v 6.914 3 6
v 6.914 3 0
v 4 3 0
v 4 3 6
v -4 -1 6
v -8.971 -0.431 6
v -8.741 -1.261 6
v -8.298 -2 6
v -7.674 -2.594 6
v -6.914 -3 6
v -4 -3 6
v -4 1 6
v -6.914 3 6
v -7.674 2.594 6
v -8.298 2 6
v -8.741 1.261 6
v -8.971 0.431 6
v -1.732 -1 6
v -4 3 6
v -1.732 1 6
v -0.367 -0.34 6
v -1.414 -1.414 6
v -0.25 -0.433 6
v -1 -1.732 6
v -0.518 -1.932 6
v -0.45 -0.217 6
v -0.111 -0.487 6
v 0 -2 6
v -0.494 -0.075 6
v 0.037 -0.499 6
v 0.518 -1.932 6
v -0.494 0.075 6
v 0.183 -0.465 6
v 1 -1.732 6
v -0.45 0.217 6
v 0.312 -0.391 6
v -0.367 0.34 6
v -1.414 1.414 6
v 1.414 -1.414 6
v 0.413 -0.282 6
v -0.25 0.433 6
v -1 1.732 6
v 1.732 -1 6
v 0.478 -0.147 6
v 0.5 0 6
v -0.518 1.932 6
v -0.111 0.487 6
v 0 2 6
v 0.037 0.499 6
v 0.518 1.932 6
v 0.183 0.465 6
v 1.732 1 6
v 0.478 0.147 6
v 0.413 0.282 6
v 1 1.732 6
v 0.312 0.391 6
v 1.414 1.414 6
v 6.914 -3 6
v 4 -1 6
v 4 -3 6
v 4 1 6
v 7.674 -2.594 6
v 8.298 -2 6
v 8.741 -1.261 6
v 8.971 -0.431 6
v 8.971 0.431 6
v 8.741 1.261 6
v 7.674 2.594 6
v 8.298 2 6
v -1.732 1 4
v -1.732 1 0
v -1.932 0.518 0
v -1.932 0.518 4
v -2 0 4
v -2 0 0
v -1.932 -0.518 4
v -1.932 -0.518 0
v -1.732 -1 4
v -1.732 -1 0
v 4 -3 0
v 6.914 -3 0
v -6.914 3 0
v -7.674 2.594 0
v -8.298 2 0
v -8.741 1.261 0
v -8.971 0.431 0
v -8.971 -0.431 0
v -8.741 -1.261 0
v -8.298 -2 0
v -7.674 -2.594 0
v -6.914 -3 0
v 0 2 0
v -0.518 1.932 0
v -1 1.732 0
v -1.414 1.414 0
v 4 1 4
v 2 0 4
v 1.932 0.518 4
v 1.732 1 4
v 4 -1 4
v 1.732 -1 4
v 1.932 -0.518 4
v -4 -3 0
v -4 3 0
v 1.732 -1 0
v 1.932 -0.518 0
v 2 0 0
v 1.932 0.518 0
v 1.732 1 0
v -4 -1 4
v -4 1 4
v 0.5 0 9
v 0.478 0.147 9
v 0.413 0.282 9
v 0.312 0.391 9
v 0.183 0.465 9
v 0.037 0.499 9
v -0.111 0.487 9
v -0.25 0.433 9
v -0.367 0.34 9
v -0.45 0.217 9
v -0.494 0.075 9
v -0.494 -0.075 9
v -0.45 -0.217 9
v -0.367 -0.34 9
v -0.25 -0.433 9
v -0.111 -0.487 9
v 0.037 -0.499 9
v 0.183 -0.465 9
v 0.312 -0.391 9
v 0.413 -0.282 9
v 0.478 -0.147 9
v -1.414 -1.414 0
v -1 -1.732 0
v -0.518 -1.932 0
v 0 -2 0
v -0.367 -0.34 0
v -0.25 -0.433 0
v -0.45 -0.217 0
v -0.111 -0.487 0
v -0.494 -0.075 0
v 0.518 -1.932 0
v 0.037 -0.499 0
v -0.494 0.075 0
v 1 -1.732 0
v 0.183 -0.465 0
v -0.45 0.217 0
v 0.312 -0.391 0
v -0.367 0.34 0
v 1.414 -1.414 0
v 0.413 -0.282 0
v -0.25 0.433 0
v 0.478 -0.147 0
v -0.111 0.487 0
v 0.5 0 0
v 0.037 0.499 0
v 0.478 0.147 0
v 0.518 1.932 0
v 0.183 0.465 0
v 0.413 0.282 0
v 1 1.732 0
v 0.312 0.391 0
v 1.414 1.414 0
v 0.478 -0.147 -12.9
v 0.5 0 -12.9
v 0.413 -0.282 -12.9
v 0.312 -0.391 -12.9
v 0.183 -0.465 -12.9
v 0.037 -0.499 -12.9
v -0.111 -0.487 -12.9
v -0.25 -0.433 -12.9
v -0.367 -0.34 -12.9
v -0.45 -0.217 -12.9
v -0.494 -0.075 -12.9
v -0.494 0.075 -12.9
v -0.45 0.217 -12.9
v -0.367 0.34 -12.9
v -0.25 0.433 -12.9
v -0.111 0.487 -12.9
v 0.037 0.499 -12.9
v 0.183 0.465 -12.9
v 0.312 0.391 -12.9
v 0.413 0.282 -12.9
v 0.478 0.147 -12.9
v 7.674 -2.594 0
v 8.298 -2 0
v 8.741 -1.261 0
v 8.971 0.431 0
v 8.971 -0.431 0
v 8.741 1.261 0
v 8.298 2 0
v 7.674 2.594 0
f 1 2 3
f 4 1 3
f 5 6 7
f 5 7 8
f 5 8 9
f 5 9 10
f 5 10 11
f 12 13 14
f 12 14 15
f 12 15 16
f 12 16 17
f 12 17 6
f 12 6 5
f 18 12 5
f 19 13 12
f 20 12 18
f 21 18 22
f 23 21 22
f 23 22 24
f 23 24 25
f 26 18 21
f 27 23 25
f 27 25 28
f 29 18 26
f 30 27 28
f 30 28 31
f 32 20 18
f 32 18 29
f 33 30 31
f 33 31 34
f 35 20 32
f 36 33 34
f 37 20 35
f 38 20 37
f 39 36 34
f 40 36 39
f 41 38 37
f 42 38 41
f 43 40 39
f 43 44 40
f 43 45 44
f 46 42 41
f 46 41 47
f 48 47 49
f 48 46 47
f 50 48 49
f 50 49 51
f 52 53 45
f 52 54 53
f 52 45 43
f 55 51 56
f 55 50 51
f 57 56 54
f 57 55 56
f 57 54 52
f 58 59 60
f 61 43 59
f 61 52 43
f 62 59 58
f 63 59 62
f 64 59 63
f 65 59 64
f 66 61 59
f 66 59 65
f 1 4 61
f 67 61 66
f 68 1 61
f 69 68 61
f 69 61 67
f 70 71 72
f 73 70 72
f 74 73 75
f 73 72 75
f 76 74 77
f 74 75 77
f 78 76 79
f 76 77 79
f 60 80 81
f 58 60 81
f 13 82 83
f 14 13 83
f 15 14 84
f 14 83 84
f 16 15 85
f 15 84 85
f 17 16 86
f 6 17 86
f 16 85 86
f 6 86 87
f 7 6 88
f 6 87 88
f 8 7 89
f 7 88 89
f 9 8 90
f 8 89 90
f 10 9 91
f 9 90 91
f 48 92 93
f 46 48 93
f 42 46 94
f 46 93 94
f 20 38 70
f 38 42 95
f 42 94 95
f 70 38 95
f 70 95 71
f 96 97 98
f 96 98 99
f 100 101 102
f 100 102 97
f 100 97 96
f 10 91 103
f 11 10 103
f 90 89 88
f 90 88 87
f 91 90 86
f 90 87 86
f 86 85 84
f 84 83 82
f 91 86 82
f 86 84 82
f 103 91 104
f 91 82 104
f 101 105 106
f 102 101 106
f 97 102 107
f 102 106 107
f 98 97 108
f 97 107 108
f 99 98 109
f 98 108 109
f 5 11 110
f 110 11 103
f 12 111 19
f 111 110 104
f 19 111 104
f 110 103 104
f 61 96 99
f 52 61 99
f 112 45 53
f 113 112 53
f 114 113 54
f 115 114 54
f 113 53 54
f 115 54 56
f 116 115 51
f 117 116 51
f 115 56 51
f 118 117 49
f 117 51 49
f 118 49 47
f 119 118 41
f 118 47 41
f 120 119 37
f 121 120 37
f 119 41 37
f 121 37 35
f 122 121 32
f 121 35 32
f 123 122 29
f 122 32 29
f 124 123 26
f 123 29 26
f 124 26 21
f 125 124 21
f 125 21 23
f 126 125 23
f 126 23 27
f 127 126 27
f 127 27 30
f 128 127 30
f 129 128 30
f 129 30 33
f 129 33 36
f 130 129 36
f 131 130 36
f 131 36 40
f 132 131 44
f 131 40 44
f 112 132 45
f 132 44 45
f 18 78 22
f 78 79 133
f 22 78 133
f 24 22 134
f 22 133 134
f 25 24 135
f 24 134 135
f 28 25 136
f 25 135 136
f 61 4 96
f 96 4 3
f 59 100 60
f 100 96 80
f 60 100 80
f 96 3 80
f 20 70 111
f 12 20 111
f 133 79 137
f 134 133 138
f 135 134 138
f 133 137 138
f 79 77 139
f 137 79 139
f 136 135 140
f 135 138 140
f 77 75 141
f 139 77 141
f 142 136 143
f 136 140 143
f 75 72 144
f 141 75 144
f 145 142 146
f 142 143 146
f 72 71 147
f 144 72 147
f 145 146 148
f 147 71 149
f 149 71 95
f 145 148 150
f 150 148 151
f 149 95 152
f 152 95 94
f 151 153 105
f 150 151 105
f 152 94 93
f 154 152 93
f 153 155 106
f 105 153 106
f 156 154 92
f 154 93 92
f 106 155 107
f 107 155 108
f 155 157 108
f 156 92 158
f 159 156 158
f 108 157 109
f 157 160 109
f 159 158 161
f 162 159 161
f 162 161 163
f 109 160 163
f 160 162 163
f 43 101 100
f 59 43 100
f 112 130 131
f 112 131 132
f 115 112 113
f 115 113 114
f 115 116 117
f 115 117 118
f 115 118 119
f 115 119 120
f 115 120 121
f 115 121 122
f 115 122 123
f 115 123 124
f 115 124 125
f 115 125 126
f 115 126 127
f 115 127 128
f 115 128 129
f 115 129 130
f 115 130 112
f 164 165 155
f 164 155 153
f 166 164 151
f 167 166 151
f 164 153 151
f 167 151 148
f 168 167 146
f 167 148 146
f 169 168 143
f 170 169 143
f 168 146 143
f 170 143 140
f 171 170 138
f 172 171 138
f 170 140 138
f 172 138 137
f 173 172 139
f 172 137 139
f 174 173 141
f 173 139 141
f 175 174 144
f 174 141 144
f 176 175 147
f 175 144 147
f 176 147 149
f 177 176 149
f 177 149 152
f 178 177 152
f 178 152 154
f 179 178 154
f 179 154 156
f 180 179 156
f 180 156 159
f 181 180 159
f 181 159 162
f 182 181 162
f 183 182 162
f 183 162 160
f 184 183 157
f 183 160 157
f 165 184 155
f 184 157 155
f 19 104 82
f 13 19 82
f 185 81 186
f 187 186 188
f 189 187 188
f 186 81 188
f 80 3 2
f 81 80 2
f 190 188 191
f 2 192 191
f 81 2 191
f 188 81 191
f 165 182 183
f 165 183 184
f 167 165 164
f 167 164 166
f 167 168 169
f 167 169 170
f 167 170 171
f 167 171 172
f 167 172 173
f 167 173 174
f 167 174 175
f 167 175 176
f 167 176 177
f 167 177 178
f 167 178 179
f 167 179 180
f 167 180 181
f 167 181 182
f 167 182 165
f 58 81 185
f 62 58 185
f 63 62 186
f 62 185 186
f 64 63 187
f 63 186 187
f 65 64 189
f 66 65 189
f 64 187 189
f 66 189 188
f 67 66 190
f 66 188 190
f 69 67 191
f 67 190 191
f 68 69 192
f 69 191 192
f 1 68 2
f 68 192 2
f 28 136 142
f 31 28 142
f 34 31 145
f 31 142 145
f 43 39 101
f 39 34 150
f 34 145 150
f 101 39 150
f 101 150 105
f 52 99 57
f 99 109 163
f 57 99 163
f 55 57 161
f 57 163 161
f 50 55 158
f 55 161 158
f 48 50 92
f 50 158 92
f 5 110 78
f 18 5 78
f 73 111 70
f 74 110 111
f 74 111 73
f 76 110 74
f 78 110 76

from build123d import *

# Parameters (mm, degrees)
F1_DEPTH = 6
F3_DEPTH = 4
F4_R     = 0.5
F5_DEPTH = 3
F6_R     = 0.5
F7_DEPTH = 12.9


with BuildPart() as f1:
    # F0 (on Top) → F1 (new body)
    with BuildSketch(Plane.XY):
        with BuildLine():
            Line((4, 1), (1.7320508076, 1))
            ThreePointArc((1.7320508076, 1), (1, 1.7320508076), (0, 2))
            ThreePointArc((0, 2), (-1, 1.7320508076), (-1.7320508076, 1))
            Line((-1.7320508076, 1), (-4, 1))
            Line((-4, 1), (-4, 3))
            Line((-4, 3), (-6.9135528726, 3))
            ThreePointArc((-6.9135528726, 3), (-9, 0), (-6.9135528726, -3))
            Line((-6.9135528726, -3), (-4, -3))
            Line((-4, -3), (-4, -1))
            Line((-4, -1), (-1.7320508076, -1))
            ThreePointArc((-1.7320508076, -1), (-1, -1.7320508076), (0, -2))
            ThreePointArc((0, -2), (1, -1.7320508076), (1.7320508076, -1))
            Line((1.7320508076, -1), (4, -1))
            Line((4, -1), (4, -3))
            Line((4, -3), (6.9135528726, -3))
            ThreePointArc((6.9135528726, -3), (9, 0), (6.9135528726, 3))
            Line((6.9135528726, 3), (4, 3))
            Line((4, 3), (4, 1))
        make_face()
    extrude(amount=F1_DEPTH)

    # F2 (on face) → F3 (cut)
    with BuildSketch(Plane(origin=(0, 0, 0), x_dir=(1, 0, 0), z_dir=(0, 0, -1))):
        with BuildLine():
            ThreePointArc((-1.7320508076, -1), (-2, 0), (-1.7320508076, 1))
            Line((-1.7320508076, 1), (-4, 1))
            Line((-4, 1), (-4, -1))
            Line((-4, -1), (-1.7320508076, -1))
        make_face()
        with BuildLine():
            ThreePointArc((1.7320508076, 1), (2, 0), (1.7320508076, -1))
            Line((1.7320508076, -1), (4, -1))
            Line((4, -1), (4, 1))
            Line((4, 1), (1.7320508076, 1))
        make_face()
    extrude(amount=-F3_DEPTH, mode=Mode.SUBTRACT)

    # F4 (on face) → F5 (join)
    with BuildSketch(Plane.XY.offset(6)):
        Circle(F4_R)
    extrude(amount=F5_DEPTH)

    # F6 (on face) → F7 (join)
    with BuildSketch(Plane(origin=(0, 0, 0), x_dir=(1, 0, 0), z_dir=(0, 0, -1))):
        Circle(F6_R)
    extrude(amount=F7_DEPTH)


solid = f1.part
